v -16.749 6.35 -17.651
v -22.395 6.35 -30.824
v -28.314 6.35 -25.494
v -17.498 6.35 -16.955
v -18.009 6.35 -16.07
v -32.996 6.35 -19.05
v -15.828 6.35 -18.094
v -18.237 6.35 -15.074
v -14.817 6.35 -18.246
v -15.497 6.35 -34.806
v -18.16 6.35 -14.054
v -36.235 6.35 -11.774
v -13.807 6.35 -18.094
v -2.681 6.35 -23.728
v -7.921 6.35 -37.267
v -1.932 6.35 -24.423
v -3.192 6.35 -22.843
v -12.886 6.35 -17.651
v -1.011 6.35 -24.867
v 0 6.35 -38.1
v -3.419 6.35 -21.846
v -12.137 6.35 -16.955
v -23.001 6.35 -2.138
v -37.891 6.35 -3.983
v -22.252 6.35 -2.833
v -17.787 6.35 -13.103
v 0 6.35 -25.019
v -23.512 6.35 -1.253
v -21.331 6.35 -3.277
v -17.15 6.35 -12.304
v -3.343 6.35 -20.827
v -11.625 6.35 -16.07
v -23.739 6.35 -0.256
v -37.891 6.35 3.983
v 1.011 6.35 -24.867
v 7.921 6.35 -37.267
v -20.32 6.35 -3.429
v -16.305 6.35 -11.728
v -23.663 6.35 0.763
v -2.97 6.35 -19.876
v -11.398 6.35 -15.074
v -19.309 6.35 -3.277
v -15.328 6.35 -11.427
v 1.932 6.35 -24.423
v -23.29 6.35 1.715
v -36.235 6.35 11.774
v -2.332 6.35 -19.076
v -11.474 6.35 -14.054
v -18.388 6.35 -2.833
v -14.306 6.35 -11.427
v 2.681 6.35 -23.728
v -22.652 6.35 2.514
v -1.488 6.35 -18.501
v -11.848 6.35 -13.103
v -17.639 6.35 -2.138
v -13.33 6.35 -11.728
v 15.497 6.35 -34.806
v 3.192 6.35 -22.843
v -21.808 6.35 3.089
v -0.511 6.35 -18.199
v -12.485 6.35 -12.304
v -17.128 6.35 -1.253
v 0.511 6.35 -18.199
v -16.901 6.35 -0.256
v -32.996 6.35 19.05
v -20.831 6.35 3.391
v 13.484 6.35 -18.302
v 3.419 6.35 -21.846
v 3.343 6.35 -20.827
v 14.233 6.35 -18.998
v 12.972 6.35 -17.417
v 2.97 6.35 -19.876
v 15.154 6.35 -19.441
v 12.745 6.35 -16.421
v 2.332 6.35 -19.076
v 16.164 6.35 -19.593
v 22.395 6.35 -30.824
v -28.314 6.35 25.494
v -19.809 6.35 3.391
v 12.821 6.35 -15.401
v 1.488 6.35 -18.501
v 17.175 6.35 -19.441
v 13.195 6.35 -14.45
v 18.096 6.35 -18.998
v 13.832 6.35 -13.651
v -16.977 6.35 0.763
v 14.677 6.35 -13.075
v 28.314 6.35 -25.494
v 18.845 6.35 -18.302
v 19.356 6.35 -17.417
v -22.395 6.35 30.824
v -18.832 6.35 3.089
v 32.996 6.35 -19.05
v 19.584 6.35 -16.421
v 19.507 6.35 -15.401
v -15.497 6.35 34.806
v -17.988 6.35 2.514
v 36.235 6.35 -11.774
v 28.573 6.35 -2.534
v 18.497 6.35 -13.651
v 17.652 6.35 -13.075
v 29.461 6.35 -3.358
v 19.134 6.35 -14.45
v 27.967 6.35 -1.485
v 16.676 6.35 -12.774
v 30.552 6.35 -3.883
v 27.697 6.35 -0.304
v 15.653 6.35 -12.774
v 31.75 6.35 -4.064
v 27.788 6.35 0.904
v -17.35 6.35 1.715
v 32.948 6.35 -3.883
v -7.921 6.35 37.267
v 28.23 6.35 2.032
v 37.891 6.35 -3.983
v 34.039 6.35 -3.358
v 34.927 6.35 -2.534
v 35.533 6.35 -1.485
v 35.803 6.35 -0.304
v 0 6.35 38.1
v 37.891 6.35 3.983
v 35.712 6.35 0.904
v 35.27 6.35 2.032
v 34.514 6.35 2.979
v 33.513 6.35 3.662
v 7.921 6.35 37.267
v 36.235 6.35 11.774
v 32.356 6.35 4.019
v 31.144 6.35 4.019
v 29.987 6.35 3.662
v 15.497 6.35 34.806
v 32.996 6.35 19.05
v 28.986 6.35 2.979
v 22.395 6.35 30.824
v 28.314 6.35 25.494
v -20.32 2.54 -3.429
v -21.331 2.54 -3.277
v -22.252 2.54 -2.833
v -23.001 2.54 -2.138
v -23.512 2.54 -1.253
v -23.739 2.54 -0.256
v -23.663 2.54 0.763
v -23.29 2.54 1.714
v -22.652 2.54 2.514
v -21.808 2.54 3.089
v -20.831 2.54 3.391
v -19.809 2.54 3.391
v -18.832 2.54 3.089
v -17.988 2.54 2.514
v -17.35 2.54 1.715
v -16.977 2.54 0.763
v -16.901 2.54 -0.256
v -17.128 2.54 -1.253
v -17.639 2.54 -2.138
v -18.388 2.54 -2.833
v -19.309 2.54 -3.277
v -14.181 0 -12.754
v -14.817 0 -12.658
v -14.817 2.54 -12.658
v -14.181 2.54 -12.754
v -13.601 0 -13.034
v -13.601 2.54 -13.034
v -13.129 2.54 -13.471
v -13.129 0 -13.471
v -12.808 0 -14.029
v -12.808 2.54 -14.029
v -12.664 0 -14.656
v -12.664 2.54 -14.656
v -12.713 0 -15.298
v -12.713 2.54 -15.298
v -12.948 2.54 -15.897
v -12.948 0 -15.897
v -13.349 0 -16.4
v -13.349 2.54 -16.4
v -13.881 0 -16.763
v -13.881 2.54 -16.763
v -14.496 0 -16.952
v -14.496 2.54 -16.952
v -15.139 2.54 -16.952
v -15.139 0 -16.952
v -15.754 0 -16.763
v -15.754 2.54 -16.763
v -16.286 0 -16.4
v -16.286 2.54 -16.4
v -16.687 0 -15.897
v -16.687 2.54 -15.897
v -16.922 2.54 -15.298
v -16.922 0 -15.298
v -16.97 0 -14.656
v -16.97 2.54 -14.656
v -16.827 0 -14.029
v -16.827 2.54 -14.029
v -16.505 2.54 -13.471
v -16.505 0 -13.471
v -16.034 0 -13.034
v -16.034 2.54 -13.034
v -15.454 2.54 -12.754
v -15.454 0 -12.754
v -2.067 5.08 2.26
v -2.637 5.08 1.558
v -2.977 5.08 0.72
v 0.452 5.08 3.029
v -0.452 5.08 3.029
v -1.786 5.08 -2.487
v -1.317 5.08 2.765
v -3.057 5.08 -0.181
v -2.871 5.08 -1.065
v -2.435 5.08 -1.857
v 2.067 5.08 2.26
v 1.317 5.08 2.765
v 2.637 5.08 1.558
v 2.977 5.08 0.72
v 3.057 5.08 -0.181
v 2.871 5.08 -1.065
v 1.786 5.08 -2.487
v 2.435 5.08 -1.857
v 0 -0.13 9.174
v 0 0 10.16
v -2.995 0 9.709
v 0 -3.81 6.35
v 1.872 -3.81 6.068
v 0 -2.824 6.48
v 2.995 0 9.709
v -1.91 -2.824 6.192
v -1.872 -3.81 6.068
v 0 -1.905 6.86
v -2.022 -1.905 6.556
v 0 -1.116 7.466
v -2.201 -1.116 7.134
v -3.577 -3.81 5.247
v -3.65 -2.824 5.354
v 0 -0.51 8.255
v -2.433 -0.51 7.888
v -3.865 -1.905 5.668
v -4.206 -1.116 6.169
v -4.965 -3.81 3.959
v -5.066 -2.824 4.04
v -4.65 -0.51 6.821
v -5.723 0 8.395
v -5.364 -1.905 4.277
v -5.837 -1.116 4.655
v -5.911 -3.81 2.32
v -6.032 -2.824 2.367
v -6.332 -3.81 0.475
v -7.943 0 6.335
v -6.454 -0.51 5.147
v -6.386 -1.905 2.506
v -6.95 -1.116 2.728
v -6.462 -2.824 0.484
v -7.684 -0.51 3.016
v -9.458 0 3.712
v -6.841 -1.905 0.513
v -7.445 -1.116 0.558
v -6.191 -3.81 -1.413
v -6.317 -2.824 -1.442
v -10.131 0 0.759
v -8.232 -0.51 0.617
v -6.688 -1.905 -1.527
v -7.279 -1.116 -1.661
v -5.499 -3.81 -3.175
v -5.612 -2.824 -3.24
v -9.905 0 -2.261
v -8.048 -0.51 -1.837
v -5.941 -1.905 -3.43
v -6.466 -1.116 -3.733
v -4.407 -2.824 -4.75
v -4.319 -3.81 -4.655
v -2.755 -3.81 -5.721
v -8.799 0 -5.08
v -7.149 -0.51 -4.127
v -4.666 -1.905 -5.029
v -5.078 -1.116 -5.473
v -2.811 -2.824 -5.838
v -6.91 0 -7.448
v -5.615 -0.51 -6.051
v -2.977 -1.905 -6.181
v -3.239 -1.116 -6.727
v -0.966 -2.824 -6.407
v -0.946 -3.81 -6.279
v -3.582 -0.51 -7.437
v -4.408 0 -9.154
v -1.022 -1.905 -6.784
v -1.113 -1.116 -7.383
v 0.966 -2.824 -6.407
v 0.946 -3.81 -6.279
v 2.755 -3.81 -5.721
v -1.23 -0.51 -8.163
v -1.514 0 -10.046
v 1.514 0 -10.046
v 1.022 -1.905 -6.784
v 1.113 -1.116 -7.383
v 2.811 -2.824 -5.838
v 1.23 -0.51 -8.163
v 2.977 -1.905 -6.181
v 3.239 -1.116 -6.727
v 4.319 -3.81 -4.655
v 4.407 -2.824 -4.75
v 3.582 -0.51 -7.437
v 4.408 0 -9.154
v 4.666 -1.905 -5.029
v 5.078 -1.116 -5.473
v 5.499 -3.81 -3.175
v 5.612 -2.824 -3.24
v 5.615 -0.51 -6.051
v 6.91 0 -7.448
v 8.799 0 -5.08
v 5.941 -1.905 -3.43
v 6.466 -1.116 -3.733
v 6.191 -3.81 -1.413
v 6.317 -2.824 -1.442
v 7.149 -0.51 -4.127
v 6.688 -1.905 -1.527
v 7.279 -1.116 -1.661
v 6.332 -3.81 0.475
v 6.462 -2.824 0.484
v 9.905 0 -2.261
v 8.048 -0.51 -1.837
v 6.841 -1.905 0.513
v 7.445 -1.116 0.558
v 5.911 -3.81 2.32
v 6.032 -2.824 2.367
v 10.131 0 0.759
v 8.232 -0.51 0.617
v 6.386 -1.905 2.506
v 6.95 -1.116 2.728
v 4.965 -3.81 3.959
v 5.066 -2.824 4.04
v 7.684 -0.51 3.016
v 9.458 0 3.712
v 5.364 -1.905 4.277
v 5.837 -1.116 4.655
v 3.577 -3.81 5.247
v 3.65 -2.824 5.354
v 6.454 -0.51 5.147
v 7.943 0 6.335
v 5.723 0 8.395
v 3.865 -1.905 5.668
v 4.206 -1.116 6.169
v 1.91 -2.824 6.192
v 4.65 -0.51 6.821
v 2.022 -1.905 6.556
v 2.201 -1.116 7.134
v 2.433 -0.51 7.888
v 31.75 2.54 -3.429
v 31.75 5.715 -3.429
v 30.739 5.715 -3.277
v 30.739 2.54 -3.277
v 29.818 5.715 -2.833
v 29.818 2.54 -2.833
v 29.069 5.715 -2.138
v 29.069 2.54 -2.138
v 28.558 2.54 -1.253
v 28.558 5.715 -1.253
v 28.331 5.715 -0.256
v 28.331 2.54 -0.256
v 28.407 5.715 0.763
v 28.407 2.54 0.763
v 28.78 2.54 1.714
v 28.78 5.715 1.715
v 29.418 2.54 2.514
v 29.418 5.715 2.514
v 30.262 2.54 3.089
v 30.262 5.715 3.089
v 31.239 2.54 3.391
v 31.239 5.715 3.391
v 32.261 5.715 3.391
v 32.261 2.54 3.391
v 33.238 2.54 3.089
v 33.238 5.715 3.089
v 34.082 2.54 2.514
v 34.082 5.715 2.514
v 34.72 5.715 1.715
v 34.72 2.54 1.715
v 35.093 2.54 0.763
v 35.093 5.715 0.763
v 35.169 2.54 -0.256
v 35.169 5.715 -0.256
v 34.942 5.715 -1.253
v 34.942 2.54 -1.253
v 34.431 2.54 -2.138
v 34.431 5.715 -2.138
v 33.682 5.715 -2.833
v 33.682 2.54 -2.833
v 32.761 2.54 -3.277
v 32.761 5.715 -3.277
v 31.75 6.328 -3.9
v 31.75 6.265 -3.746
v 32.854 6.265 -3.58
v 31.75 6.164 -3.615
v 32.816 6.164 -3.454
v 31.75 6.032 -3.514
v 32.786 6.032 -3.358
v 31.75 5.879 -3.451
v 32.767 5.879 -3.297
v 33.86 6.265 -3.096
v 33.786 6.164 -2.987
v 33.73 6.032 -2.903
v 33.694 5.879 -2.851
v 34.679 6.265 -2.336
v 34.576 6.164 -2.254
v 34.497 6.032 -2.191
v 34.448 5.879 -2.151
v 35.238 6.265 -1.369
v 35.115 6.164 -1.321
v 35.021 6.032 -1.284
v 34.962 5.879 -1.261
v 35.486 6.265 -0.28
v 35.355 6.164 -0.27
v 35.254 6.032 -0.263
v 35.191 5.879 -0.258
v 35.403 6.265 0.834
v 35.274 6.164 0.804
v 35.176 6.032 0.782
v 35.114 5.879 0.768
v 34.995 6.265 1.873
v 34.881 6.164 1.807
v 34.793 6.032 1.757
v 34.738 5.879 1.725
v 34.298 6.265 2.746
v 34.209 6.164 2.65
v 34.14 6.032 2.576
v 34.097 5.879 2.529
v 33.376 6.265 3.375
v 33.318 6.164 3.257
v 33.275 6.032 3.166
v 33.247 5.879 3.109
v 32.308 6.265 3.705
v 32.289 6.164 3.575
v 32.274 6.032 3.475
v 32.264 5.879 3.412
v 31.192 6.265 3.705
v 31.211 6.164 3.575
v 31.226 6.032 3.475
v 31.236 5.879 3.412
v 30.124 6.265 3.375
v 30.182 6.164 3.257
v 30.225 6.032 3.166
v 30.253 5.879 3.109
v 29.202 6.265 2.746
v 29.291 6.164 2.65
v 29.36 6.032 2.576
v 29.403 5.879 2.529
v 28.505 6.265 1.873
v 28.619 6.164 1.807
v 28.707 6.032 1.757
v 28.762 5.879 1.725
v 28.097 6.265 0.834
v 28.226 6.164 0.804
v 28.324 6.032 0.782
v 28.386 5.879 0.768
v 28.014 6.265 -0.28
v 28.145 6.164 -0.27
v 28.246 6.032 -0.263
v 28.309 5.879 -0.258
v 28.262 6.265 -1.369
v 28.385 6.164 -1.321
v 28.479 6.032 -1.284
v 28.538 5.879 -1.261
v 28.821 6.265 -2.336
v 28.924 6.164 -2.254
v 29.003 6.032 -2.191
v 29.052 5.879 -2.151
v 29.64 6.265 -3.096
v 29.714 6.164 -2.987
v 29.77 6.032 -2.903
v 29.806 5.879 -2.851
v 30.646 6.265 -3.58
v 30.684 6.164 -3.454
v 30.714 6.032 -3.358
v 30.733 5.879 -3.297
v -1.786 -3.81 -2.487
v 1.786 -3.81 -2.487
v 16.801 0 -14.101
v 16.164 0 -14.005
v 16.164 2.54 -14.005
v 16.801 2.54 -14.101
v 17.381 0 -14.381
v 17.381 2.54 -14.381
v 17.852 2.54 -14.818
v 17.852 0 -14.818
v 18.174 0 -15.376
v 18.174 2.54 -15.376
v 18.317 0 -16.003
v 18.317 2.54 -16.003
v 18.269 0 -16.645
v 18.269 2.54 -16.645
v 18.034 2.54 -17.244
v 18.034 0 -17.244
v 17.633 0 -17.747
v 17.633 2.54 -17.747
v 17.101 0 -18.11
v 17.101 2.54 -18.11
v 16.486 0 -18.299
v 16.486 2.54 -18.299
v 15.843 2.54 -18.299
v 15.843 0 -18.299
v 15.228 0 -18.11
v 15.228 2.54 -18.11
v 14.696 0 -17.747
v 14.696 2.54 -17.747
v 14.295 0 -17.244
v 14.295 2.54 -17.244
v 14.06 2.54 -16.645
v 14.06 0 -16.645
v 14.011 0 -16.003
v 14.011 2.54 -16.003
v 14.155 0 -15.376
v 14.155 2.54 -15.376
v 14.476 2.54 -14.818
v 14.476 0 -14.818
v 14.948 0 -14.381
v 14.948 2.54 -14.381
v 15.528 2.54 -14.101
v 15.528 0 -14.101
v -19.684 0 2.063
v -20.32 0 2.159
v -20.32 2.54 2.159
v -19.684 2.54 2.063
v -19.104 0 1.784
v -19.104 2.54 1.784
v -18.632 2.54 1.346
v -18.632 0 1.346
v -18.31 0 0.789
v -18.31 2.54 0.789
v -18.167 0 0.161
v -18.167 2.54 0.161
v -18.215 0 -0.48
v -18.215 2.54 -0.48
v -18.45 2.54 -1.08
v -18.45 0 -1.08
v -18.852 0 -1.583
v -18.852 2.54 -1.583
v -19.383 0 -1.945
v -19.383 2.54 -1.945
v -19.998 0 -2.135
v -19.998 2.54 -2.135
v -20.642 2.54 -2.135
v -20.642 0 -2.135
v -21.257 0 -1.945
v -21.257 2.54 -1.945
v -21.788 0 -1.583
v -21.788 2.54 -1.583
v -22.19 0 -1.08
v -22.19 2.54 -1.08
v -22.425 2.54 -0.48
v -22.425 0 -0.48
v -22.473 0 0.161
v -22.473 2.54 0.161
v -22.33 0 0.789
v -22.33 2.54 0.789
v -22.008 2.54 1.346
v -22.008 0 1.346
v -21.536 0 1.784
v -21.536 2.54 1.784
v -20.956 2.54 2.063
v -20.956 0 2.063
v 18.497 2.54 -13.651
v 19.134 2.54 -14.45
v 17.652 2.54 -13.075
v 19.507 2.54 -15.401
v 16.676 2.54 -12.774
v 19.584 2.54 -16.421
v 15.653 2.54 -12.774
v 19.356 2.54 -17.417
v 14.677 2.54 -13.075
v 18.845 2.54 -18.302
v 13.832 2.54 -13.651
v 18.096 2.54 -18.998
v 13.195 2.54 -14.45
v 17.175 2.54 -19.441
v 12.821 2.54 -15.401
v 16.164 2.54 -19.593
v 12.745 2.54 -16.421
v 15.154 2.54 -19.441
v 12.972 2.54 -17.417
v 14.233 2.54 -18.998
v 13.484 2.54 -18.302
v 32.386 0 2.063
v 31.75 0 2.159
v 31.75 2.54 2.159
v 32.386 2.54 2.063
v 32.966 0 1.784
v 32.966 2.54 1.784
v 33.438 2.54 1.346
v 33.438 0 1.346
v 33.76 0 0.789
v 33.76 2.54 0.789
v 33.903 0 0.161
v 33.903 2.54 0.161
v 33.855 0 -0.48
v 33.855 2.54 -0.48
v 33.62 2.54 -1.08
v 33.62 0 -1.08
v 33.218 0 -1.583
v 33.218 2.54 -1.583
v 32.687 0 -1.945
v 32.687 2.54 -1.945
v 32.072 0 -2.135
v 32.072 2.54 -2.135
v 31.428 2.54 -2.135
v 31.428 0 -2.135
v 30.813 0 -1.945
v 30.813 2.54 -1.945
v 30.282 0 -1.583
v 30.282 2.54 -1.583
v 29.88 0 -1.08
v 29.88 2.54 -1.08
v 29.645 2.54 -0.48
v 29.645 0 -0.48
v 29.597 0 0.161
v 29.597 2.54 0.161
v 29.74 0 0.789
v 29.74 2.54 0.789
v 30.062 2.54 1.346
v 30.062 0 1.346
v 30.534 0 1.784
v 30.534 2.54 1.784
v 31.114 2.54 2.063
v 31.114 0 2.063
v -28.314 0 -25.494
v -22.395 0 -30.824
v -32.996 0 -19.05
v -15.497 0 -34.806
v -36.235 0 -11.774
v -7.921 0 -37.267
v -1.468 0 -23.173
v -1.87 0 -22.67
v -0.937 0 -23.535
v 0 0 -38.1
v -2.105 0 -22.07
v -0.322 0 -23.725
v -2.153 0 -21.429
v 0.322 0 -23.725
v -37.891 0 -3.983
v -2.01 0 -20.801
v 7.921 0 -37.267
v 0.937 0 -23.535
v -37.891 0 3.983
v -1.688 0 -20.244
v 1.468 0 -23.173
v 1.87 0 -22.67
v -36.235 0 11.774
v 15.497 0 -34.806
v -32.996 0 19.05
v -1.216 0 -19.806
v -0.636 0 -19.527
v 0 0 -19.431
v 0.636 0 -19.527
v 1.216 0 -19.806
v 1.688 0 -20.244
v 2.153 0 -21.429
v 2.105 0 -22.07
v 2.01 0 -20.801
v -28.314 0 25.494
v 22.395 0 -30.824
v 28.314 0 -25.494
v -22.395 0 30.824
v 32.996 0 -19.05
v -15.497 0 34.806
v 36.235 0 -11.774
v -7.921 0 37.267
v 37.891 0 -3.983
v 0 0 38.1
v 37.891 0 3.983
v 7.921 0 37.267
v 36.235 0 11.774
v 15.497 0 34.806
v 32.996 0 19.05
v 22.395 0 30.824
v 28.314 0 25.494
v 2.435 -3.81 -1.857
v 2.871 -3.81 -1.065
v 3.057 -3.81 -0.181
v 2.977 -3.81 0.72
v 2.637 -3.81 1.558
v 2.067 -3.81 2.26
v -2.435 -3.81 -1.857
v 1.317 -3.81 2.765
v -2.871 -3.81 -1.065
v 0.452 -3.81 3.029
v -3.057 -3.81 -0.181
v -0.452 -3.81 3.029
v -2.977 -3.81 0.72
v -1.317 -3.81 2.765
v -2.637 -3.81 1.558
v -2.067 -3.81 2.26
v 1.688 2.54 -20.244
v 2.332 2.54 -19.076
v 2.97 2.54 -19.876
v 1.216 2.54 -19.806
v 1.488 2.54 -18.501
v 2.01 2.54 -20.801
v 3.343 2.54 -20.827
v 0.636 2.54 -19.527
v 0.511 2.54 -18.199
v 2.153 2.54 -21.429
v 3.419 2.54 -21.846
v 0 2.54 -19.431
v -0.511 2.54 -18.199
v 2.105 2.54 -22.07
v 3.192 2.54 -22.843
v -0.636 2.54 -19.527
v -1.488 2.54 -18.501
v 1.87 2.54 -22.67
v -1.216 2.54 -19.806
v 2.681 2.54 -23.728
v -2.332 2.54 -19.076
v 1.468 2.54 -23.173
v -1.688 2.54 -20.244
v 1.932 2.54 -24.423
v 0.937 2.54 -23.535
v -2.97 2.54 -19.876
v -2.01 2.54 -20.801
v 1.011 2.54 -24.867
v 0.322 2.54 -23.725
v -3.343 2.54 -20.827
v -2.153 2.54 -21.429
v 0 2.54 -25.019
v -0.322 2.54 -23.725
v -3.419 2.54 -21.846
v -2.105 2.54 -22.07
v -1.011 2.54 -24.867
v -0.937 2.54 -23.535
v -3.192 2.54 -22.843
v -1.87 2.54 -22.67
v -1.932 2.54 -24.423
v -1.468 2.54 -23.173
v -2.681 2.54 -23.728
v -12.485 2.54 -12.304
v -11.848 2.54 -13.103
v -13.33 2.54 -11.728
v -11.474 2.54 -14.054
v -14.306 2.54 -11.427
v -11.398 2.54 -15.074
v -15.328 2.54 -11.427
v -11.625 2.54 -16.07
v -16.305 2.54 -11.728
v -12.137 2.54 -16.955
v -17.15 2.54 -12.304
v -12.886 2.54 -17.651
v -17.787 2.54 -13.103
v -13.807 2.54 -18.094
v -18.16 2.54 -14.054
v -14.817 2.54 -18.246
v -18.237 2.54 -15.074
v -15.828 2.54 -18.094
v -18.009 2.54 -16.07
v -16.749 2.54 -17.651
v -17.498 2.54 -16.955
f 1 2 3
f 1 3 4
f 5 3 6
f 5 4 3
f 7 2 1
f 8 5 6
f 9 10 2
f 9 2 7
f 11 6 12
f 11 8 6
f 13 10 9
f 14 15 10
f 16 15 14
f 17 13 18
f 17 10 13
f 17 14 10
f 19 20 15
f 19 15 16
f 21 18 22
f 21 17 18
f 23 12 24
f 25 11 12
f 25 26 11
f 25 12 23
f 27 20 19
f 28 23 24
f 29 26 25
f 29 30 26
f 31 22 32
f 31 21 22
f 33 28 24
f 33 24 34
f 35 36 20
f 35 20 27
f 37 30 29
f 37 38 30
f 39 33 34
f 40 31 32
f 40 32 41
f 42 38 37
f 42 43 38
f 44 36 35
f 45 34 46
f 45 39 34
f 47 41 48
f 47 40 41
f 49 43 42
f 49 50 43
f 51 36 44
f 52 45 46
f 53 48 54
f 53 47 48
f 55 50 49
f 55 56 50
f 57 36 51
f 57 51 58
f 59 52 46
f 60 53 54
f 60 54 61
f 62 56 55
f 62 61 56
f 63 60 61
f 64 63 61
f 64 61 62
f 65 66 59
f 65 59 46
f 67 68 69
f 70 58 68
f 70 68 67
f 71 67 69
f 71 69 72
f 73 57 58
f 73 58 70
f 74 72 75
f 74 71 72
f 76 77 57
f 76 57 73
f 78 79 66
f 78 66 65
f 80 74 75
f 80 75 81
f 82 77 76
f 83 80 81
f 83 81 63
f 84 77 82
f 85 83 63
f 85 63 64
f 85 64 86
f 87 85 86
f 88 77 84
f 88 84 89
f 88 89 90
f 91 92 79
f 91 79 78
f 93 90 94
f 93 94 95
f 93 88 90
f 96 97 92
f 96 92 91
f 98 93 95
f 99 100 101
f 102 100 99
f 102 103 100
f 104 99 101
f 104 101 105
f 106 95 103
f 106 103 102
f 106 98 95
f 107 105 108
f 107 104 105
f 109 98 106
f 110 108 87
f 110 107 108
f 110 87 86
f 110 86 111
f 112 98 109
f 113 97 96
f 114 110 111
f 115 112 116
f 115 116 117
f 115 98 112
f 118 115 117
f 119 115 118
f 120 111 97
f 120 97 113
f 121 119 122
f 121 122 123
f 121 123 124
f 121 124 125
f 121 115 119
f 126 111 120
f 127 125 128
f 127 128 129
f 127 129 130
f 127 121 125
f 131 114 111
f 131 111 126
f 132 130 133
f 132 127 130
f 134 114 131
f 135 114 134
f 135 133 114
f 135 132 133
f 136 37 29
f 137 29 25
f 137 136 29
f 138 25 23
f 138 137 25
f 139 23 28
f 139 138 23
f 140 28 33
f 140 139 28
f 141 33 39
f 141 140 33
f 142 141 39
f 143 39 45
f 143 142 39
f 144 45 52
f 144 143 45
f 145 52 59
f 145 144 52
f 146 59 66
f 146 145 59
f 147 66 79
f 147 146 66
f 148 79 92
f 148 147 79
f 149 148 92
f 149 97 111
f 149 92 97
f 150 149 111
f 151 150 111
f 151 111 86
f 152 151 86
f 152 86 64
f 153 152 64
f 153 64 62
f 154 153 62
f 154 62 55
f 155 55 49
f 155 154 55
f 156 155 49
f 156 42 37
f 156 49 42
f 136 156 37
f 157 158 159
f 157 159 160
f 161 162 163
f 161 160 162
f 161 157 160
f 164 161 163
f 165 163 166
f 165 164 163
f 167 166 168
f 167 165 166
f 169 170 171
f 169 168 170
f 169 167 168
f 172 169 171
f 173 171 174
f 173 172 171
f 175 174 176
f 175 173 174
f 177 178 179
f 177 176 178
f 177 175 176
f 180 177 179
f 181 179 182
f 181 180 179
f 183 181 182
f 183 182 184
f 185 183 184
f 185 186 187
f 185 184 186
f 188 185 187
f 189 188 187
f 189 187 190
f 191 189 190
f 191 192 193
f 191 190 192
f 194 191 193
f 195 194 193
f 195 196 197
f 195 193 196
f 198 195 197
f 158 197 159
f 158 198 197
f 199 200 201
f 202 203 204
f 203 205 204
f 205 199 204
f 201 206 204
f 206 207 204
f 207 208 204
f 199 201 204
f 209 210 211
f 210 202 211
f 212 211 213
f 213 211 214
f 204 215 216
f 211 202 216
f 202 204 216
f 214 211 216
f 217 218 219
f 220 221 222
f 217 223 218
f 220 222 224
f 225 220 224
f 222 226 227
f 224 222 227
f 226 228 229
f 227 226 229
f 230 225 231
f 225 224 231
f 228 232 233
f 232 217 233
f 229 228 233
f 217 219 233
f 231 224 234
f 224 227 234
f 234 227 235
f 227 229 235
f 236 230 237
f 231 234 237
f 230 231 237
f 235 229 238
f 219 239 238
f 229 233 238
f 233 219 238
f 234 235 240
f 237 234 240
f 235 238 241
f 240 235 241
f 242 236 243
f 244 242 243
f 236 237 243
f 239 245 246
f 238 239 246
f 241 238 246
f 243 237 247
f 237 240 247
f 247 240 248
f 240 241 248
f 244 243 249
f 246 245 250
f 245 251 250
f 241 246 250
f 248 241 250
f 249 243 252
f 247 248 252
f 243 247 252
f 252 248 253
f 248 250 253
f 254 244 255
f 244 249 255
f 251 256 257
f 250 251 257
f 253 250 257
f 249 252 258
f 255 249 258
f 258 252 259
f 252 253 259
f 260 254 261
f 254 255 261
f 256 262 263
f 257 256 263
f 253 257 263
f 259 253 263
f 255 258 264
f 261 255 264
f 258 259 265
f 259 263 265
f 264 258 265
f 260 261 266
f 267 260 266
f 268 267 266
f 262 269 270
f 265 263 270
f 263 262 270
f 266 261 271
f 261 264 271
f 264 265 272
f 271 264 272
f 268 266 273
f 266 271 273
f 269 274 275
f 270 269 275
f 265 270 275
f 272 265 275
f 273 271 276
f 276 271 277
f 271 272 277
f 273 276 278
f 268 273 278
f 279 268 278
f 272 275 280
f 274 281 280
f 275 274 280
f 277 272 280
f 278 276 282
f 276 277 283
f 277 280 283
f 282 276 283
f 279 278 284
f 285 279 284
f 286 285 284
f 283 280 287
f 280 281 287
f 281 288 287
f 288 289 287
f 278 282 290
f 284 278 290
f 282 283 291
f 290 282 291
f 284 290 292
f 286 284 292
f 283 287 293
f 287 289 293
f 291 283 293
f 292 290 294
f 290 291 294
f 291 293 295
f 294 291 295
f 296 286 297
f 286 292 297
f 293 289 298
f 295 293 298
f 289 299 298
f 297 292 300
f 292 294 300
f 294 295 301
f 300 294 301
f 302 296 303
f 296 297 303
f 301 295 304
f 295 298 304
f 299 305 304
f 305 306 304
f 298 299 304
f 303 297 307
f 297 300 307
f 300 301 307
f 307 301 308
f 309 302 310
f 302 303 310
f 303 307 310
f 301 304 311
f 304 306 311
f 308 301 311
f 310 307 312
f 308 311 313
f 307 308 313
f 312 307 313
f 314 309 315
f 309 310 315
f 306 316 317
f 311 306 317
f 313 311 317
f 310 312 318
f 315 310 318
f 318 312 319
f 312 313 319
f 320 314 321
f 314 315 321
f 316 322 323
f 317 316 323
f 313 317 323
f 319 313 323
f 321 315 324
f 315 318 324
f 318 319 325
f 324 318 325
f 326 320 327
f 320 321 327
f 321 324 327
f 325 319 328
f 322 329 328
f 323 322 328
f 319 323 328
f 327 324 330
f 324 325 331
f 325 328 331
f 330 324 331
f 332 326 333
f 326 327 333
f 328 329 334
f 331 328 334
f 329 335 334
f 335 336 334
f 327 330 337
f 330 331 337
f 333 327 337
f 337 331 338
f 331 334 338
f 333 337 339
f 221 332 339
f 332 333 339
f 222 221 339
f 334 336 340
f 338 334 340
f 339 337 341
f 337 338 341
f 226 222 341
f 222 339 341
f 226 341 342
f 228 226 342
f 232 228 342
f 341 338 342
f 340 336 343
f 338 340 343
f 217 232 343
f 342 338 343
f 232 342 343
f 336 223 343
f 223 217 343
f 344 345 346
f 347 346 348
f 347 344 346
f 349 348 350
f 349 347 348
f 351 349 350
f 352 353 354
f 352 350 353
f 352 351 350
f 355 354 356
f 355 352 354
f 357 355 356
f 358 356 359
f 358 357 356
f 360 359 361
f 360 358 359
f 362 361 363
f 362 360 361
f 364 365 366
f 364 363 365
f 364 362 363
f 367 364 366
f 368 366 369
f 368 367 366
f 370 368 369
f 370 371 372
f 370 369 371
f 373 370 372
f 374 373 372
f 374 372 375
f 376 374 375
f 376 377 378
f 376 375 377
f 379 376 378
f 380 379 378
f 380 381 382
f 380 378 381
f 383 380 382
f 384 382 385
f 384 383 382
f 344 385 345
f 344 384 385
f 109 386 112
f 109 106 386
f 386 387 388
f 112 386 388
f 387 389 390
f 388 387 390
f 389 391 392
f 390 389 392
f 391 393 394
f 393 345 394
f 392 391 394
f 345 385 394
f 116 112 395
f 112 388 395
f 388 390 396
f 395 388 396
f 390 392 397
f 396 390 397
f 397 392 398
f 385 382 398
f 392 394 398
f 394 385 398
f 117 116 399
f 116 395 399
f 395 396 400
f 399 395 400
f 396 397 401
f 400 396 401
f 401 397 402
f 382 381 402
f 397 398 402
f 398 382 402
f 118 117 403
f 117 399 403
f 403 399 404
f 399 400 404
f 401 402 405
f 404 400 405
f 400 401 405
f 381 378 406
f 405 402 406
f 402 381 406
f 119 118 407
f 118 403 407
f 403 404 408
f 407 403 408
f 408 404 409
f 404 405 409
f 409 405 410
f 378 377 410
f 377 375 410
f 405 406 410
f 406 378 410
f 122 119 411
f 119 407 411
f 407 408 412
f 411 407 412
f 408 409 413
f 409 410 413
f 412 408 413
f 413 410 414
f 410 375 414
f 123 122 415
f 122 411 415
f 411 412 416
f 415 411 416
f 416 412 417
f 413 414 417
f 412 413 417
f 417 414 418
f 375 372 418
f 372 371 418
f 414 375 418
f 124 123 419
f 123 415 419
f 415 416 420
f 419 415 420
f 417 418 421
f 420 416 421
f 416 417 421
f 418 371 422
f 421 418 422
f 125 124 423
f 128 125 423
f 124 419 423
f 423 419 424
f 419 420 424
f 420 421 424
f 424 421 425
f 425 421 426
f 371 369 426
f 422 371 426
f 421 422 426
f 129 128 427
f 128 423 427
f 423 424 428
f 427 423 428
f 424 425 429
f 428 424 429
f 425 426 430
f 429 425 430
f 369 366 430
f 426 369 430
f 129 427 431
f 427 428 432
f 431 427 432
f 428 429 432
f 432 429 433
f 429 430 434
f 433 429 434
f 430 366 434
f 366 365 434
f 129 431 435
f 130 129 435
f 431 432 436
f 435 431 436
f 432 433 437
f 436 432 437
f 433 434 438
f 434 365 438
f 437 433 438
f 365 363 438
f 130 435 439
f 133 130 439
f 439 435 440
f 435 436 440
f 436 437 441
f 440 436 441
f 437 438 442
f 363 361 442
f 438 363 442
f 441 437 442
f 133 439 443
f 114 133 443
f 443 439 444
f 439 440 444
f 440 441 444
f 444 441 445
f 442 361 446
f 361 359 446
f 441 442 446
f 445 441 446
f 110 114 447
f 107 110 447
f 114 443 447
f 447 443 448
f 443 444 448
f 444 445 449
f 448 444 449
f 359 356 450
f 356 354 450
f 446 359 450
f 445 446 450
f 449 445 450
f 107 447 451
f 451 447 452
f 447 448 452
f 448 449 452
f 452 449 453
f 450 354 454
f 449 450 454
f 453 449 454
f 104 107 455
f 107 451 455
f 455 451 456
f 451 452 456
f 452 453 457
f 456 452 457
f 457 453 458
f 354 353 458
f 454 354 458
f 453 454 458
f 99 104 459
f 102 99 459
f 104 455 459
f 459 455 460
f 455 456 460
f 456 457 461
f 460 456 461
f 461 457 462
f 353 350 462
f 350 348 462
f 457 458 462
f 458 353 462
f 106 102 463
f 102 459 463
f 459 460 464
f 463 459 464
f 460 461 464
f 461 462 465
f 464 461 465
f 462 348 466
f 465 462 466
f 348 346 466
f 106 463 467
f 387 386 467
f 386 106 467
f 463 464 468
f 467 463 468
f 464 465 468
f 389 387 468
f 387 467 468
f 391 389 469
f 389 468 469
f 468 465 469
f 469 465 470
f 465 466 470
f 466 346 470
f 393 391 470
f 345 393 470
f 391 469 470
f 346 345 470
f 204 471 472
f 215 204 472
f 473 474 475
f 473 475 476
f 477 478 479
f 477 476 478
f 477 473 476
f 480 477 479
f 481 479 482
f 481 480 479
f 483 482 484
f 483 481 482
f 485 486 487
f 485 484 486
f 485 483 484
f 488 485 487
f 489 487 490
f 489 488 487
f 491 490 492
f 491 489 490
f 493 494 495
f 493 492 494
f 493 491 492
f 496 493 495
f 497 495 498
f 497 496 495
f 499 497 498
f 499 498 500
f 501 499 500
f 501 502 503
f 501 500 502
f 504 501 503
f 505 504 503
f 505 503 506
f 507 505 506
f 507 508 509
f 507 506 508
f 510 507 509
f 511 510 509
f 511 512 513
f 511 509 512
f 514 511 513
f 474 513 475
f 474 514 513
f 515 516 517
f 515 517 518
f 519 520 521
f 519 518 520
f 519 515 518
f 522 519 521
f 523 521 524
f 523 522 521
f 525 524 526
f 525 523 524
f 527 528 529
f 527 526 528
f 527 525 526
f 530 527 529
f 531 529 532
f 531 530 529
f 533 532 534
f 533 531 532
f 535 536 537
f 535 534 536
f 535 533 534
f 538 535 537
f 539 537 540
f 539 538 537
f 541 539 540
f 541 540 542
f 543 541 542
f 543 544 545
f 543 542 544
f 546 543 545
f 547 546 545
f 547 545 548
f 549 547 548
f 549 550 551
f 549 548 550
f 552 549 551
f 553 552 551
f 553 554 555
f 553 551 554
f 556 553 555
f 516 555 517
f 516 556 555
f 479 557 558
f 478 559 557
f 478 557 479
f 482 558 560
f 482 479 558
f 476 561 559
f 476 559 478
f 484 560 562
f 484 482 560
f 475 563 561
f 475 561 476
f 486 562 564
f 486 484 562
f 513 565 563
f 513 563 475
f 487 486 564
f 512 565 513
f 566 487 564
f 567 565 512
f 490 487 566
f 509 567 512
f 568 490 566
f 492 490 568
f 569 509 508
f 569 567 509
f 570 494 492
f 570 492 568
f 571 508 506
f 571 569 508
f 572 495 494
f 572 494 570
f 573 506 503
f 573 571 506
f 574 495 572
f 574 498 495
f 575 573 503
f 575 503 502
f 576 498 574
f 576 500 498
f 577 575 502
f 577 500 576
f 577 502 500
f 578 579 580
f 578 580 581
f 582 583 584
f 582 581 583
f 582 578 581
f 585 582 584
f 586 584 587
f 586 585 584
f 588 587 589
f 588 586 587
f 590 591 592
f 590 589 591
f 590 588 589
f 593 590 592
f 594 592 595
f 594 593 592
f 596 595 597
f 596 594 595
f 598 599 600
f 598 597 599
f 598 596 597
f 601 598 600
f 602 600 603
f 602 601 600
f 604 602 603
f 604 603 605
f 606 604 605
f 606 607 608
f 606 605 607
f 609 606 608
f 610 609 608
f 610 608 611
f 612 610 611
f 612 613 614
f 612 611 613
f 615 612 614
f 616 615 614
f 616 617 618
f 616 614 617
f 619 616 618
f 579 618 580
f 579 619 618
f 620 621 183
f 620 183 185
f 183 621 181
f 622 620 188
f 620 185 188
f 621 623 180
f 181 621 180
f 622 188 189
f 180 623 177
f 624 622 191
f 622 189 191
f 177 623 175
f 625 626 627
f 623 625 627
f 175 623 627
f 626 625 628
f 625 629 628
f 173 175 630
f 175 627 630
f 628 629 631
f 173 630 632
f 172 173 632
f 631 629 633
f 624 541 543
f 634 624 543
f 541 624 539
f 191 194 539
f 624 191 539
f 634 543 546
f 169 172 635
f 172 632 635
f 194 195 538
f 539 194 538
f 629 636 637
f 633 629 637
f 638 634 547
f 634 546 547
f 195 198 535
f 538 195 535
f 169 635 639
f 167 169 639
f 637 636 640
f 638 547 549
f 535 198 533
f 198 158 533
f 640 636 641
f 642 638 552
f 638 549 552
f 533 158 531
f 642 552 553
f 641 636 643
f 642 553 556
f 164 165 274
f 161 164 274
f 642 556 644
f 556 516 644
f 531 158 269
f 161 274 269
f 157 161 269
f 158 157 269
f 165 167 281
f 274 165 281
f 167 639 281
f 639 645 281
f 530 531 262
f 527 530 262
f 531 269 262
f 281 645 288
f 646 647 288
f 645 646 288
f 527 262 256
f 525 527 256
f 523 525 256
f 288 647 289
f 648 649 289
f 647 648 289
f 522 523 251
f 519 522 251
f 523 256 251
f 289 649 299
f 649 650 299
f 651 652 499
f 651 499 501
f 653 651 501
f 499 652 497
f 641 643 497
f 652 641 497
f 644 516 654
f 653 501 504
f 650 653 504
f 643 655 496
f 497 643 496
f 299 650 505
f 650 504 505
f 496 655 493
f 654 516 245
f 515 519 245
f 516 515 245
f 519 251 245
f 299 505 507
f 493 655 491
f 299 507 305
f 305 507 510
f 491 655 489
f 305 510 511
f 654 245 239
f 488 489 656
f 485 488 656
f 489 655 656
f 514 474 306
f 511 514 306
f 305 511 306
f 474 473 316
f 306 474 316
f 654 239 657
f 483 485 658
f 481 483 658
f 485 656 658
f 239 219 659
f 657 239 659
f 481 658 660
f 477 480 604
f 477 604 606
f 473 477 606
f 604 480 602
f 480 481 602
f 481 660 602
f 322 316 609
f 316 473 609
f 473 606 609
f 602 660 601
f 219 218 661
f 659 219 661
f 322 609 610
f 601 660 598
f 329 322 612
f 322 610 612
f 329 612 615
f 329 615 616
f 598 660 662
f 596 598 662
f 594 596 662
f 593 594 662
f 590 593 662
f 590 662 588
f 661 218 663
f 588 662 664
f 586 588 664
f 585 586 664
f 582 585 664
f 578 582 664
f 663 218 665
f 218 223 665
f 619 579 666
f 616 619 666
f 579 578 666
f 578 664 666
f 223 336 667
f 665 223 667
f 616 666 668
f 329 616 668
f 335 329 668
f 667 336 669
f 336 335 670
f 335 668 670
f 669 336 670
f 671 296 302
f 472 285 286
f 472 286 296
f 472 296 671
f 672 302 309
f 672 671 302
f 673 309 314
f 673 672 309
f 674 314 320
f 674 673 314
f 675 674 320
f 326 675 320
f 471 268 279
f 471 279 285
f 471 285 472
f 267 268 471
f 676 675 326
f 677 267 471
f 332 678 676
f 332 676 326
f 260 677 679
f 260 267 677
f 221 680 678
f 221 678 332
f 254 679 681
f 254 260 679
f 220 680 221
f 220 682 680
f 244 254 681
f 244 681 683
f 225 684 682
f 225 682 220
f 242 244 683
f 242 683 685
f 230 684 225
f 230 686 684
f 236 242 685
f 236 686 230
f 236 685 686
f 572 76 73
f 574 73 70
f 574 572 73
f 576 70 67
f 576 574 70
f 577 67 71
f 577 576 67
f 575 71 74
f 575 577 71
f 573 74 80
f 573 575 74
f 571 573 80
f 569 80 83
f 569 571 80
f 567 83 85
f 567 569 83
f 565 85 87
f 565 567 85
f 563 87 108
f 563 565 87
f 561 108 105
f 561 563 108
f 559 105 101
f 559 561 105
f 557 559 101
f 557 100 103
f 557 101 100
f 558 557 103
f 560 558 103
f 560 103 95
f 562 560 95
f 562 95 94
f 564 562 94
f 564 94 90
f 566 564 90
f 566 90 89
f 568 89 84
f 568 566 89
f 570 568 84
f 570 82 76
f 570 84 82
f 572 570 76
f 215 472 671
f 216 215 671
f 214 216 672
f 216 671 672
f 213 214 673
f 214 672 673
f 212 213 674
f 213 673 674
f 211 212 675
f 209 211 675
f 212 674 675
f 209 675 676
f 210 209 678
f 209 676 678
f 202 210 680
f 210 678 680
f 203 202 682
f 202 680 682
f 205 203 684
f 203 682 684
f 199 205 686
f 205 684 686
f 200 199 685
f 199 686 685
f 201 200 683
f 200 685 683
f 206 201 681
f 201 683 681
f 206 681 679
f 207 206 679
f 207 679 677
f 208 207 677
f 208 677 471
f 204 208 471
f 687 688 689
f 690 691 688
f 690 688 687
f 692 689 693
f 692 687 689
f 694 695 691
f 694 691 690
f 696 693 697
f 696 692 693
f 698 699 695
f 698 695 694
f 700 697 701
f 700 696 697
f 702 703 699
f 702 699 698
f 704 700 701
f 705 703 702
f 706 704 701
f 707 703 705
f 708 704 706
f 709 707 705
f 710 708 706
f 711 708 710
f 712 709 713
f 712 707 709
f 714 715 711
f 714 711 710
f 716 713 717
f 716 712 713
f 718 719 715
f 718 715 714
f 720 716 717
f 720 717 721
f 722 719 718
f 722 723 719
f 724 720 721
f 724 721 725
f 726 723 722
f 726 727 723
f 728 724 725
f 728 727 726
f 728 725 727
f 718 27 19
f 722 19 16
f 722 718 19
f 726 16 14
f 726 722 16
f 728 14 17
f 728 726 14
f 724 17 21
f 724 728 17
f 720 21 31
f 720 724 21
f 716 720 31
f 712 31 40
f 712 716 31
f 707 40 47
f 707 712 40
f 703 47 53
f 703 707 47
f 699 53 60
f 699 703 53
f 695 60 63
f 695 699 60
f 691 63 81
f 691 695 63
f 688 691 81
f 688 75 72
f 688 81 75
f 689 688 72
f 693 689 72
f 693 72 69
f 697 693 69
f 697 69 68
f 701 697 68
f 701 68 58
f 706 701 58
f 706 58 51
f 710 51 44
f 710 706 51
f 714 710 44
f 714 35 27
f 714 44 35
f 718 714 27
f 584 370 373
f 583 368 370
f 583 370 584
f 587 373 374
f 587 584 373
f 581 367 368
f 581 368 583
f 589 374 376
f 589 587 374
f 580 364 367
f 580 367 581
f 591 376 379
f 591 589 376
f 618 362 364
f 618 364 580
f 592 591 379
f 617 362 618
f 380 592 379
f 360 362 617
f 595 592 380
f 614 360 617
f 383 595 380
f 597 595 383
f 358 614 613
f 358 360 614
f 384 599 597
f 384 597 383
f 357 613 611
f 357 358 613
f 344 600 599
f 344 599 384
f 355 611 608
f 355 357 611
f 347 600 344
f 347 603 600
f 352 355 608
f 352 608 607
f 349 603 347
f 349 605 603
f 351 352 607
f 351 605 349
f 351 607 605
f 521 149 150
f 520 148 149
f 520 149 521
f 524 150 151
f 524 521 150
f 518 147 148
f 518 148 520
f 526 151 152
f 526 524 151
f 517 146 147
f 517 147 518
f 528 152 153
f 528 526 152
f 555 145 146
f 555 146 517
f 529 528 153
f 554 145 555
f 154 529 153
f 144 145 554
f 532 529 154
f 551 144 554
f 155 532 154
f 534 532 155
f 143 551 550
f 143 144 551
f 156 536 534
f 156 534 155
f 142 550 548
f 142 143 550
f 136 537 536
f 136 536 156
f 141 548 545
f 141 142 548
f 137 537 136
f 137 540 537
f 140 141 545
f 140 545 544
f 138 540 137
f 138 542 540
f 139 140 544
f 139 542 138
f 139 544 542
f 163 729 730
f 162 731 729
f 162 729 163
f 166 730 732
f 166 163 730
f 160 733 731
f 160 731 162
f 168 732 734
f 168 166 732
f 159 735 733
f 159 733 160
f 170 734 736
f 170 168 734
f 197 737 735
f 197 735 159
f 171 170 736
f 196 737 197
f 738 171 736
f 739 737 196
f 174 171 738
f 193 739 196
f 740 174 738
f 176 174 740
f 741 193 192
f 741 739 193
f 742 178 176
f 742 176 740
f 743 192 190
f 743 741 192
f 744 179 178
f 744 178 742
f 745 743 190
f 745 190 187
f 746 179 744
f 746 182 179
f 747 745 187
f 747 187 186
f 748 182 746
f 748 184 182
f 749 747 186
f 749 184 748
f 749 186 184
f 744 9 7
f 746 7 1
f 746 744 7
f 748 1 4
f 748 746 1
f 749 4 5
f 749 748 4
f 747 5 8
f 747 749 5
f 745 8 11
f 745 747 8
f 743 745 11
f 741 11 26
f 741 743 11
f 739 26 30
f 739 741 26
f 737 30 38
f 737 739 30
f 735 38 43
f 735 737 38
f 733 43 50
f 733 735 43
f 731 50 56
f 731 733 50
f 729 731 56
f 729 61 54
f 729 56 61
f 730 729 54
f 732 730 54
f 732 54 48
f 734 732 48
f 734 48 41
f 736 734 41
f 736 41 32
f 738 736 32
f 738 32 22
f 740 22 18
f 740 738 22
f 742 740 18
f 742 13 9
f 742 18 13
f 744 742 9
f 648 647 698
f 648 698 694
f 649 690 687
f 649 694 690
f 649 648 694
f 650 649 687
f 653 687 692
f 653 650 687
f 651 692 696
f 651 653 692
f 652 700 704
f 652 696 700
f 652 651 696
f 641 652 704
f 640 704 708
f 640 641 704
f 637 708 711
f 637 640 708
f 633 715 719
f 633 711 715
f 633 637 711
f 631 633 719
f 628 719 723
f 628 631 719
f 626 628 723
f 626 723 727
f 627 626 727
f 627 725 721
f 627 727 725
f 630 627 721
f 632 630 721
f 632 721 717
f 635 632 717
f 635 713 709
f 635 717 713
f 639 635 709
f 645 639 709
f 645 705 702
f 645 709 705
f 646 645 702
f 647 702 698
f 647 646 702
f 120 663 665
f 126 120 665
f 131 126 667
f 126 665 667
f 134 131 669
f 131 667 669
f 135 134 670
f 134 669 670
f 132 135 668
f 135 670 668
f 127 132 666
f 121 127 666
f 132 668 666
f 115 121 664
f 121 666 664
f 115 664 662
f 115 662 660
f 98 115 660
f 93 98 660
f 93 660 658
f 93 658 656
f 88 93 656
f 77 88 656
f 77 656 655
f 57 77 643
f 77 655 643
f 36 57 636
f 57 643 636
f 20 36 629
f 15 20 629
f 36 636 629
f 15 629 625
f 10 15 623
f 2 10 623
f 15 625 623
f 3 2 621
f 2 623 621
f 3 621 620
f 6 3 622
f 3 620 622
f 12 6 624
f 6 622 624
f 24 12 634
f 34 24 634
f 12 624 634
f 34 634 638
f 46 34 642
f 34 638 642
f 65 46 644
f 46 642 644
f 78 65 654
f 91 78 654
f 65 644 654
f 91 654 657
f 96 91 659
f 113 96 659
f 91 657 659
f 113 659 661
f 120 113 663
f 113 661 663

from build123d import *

# Parameters (mm, degrees)
SKETCH1_R               = 38.1
BOSS_EXTRUDE1_DEPTH     = 6.35
CUT_EXTRUDE1_DEPTH      = 55.254423783
CUT_EXTRUDE1_DEPTH_BACK = 3.81
SKETCH2_R               = 3.429
CUT_EXTRUDE2_DEPTH      = 55.254423783
CUT_EXTRUDE2_DEPTH_BACK = 55.254423783
SKETCH2_3_R             = 2.159
SKETCH4_R               = 6.910573657
BOSS_EXTRUDE2_DEPTH     = 1.27
BOSS_EXTRUDE3_START     = 3.81
SKETCH5_R               = 6.35
BOSS_EXTRUDE3_DEPTH     = 3.81
FILLET1_R               = 3.81
FILLET2_R               = 0.635


with BuildPart() as part:
    # Sketch1 → Boss-Extrude1 (new body)
    with BuildSketch(Plane(origin=(0, 0, 0), x_dir=(1, 0, 0), z_dir=(0, 1, 0))):
        with Locations(Location((0, 0, 0), (0, 0, 270))):
            Circle(SKETCH1_R)
        with BuildLine():
            Line((-1.786407019, 2.487499957), (1.786407019, 2.487499957))
            ThreePointArc((1.786407019, 2.487499957), (0, -3.062499971), (-1.786407019, 2.487499957))
        make_face(mode=Mode.SUBTRACT)
    extrude(amount=BOSS_EXTRUDE1_DEPTH)

    # Sketch2 → Cut-Extrude1 (cut, two sides: drawn at the far end of the back side and taken through both)
    with BuildSketch(Plane(origin=(0, 6.35, 0), x_dir=(1, 0, 0), z_dir=(0, 1, 0)).offset(-CUT_EXTRUDE1_DEPTH_BACK)):
        with Locations(Location((-20.32, 0, 0), (0, 0, 90))):
            Circle(SKETCH2_R)
        with Locations(Location((-14.8174226, 14.8174226, 0), (0, 0, 90))):
            Circle(SKETCH2_R)
        with Locations(Location((0, 21.59, 0), (0, 0, 90))):
            Circle(SKETCH2_R)
        with Locations(Location((16.164461018, 16.164461018, 0), (0, 0, 90))):
            Circle(SKETCH2_R)
        with Locations(Location((31.75, 0, 0), (0, 0, 90))):
            Circle(SKETCH2_R)
    extrude(amount=CUT_EXTRUDE1_DEPTH + CUT_EXTRUDE1_DEPTH_BACK, mode=Mode.SUBTRACT)

    # Sketch2<3> → Cut-Extrude2 (cut, two sides: drawn at the far end of the back side and taken through both)
    with BuildSketch(Plane(origin=(0, 6.35, 0), x_dir=(1, 0, 0), z_dir=(0, 1, 0)).offset(-CUT_EXTRUDE2_DEPTH_BACK)):
        with Locations(Location((-20.32, 0, 0), (0, 0, 270))):
            Circle(SKETCH2_3_R)
        with Locations(Location((-14.8174226, 14.8174226, 0), (0, 0, 270))):
            Circle(SKETCH2_3_R)
        with Locations(Location((0, 21.59, 0), (0, 0, 270))):
            Circle(SKETCH2_3_R)
        with Locations(Location((16.164461018, 16.164461018, 0), (0, 0, 270))):
            Circle(SKETCH2_3_R)
        with Locations(Location((31.75, 0, 0), (0, 0, 270))):
            Circle(SKETCH2_3_R)
    extrude(amount=CUT_EXTRUDE2_DEPTH + CUT_EXTRUDE2_DEPTH_BACK, mode=Mode.SUBTRACT)

    # Sketch4 → Boss-Extrude2 (add)
    with BuildSketch(Plane(origin=(0, 6.35, 0), x_dir=(1, 0, 0), z_dir=(0, 1, 0))):
        Circle(SKETCH4_R)
    extrude(amount=-BOSS_EXTRUDE2_DEPTH)

    # Sketch5 → Boss-Extrude3 (add)
    with BuildSketch(Plane.XZ.offset(BOSS_EXTRUDE3_START)):
        with Locations(Location((0, 0, 0), (0, 0, 90))):
            Circle(SKETCH5_R)
        with BuildLine():
            Line((-1.786407019, -2.487499957), (1.786407019, -2.487499957))
            ThreePointArc((1.786407019, -2.487499957), (0, 3.062499971), (-1.786407019, -2.487499957))
        make_face(mode=Mode.SUBTRACT)
    extrude(amount=-BOSS_EXTRUDE3_DEPTH)

    # Fillet1
    fillet1_edges = [part.edges().sort_by_distance(p)[0] for p in [
        (0, 0, -6.35),
    ]]
    fillet(fillet1_edges, radius=FILLET1_R - 0.0001)  # a hair under: the kernel refuses the full size

    # Fillet2
    fillet2_edges = [part.edges().sort_by_distance(p)[0] for p in [
        (31.75, 6.35, 3.429),
    ]]
    fillet(fillet2_edges, radius=FILLET2_R)


solid = part.part
